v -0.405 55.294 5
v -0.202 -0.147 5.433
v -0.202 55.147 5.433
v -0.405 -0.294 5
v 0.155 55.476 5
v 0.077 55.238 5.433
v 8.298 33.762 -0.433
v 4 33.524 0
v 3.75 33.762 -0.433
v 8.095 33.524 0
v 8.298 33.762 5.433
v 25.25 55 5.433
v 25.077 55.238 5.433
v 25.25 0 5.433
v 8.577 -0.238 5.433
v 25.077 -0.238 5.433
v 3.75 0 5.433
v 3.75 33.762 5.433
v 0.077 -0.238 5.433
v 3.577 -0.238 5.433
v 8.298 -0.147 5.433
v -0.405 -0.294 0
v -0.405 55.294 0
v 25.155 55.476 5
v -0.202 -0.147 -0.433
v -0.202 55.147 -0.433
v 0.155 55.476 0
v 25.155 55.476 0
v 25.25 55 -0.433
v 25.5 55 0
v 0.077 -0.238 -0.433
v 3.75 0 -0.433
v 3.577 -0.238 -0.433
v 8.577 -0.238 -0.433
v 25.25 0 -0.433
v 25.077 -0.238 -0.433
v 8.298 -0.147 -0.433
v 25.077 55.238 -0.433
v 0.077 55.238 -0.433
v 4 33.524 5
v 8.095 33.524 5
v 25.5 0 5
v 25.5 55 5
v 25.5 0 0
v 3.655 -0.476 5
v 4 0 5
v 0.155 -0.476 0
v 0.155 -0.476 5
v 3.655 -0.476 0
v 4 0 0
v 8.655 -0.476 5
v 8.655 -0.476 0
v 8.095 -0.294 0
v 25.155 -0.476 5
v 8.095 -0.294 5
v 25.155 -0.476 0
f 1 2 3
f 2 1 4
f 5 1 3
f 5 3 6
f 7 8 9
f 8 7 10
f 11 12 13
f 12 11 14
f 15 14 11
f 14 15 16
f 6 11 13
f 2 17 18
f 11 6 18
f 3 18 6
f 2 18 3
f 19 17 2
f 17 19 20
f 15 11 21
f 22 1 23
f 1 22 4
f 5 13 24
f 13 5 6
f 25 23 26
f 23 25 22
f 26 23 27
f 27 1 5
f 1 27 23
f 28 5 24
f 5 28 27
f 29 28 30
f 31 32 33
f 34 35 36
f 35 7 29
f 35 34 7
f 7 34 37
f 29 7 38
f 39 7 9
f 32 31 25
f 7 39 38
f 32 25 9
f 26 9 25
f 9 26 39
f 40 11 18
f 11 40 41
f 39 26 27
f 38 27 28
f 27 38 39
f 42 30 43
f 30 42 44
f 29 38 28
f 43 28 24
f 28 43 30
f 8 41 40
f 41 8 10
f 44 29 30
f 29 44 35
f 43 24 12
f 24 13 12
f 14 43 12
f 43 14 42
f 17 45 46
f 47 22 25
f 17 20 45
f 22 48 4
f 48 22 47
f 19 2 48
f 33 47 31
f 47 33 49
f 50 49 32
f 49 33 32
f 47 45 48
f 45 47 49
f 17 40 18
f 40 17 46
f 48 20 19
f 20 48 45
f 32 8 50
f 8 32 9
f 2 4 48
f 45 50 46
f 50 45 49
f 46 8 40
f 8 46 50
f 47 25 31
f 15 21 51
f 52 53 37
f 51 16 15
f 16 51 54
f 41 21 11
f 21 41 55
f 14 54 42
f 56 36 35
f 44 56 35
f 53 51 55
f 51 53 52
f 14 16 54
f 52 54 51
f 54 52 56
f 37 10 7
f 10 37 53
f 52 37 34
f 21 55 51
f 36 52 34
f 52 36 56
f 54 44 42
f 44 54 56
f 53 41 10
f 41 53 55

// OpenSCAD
// Unverified
/**/
 minkowski(){
  difference(){
    union(){
      cube([25,55,5]);
      }
    union(){
      translate([3.5,-1,-1])
        cube([5,35,7]);
      }
    }
  sphere(.5);
  }
/**/
